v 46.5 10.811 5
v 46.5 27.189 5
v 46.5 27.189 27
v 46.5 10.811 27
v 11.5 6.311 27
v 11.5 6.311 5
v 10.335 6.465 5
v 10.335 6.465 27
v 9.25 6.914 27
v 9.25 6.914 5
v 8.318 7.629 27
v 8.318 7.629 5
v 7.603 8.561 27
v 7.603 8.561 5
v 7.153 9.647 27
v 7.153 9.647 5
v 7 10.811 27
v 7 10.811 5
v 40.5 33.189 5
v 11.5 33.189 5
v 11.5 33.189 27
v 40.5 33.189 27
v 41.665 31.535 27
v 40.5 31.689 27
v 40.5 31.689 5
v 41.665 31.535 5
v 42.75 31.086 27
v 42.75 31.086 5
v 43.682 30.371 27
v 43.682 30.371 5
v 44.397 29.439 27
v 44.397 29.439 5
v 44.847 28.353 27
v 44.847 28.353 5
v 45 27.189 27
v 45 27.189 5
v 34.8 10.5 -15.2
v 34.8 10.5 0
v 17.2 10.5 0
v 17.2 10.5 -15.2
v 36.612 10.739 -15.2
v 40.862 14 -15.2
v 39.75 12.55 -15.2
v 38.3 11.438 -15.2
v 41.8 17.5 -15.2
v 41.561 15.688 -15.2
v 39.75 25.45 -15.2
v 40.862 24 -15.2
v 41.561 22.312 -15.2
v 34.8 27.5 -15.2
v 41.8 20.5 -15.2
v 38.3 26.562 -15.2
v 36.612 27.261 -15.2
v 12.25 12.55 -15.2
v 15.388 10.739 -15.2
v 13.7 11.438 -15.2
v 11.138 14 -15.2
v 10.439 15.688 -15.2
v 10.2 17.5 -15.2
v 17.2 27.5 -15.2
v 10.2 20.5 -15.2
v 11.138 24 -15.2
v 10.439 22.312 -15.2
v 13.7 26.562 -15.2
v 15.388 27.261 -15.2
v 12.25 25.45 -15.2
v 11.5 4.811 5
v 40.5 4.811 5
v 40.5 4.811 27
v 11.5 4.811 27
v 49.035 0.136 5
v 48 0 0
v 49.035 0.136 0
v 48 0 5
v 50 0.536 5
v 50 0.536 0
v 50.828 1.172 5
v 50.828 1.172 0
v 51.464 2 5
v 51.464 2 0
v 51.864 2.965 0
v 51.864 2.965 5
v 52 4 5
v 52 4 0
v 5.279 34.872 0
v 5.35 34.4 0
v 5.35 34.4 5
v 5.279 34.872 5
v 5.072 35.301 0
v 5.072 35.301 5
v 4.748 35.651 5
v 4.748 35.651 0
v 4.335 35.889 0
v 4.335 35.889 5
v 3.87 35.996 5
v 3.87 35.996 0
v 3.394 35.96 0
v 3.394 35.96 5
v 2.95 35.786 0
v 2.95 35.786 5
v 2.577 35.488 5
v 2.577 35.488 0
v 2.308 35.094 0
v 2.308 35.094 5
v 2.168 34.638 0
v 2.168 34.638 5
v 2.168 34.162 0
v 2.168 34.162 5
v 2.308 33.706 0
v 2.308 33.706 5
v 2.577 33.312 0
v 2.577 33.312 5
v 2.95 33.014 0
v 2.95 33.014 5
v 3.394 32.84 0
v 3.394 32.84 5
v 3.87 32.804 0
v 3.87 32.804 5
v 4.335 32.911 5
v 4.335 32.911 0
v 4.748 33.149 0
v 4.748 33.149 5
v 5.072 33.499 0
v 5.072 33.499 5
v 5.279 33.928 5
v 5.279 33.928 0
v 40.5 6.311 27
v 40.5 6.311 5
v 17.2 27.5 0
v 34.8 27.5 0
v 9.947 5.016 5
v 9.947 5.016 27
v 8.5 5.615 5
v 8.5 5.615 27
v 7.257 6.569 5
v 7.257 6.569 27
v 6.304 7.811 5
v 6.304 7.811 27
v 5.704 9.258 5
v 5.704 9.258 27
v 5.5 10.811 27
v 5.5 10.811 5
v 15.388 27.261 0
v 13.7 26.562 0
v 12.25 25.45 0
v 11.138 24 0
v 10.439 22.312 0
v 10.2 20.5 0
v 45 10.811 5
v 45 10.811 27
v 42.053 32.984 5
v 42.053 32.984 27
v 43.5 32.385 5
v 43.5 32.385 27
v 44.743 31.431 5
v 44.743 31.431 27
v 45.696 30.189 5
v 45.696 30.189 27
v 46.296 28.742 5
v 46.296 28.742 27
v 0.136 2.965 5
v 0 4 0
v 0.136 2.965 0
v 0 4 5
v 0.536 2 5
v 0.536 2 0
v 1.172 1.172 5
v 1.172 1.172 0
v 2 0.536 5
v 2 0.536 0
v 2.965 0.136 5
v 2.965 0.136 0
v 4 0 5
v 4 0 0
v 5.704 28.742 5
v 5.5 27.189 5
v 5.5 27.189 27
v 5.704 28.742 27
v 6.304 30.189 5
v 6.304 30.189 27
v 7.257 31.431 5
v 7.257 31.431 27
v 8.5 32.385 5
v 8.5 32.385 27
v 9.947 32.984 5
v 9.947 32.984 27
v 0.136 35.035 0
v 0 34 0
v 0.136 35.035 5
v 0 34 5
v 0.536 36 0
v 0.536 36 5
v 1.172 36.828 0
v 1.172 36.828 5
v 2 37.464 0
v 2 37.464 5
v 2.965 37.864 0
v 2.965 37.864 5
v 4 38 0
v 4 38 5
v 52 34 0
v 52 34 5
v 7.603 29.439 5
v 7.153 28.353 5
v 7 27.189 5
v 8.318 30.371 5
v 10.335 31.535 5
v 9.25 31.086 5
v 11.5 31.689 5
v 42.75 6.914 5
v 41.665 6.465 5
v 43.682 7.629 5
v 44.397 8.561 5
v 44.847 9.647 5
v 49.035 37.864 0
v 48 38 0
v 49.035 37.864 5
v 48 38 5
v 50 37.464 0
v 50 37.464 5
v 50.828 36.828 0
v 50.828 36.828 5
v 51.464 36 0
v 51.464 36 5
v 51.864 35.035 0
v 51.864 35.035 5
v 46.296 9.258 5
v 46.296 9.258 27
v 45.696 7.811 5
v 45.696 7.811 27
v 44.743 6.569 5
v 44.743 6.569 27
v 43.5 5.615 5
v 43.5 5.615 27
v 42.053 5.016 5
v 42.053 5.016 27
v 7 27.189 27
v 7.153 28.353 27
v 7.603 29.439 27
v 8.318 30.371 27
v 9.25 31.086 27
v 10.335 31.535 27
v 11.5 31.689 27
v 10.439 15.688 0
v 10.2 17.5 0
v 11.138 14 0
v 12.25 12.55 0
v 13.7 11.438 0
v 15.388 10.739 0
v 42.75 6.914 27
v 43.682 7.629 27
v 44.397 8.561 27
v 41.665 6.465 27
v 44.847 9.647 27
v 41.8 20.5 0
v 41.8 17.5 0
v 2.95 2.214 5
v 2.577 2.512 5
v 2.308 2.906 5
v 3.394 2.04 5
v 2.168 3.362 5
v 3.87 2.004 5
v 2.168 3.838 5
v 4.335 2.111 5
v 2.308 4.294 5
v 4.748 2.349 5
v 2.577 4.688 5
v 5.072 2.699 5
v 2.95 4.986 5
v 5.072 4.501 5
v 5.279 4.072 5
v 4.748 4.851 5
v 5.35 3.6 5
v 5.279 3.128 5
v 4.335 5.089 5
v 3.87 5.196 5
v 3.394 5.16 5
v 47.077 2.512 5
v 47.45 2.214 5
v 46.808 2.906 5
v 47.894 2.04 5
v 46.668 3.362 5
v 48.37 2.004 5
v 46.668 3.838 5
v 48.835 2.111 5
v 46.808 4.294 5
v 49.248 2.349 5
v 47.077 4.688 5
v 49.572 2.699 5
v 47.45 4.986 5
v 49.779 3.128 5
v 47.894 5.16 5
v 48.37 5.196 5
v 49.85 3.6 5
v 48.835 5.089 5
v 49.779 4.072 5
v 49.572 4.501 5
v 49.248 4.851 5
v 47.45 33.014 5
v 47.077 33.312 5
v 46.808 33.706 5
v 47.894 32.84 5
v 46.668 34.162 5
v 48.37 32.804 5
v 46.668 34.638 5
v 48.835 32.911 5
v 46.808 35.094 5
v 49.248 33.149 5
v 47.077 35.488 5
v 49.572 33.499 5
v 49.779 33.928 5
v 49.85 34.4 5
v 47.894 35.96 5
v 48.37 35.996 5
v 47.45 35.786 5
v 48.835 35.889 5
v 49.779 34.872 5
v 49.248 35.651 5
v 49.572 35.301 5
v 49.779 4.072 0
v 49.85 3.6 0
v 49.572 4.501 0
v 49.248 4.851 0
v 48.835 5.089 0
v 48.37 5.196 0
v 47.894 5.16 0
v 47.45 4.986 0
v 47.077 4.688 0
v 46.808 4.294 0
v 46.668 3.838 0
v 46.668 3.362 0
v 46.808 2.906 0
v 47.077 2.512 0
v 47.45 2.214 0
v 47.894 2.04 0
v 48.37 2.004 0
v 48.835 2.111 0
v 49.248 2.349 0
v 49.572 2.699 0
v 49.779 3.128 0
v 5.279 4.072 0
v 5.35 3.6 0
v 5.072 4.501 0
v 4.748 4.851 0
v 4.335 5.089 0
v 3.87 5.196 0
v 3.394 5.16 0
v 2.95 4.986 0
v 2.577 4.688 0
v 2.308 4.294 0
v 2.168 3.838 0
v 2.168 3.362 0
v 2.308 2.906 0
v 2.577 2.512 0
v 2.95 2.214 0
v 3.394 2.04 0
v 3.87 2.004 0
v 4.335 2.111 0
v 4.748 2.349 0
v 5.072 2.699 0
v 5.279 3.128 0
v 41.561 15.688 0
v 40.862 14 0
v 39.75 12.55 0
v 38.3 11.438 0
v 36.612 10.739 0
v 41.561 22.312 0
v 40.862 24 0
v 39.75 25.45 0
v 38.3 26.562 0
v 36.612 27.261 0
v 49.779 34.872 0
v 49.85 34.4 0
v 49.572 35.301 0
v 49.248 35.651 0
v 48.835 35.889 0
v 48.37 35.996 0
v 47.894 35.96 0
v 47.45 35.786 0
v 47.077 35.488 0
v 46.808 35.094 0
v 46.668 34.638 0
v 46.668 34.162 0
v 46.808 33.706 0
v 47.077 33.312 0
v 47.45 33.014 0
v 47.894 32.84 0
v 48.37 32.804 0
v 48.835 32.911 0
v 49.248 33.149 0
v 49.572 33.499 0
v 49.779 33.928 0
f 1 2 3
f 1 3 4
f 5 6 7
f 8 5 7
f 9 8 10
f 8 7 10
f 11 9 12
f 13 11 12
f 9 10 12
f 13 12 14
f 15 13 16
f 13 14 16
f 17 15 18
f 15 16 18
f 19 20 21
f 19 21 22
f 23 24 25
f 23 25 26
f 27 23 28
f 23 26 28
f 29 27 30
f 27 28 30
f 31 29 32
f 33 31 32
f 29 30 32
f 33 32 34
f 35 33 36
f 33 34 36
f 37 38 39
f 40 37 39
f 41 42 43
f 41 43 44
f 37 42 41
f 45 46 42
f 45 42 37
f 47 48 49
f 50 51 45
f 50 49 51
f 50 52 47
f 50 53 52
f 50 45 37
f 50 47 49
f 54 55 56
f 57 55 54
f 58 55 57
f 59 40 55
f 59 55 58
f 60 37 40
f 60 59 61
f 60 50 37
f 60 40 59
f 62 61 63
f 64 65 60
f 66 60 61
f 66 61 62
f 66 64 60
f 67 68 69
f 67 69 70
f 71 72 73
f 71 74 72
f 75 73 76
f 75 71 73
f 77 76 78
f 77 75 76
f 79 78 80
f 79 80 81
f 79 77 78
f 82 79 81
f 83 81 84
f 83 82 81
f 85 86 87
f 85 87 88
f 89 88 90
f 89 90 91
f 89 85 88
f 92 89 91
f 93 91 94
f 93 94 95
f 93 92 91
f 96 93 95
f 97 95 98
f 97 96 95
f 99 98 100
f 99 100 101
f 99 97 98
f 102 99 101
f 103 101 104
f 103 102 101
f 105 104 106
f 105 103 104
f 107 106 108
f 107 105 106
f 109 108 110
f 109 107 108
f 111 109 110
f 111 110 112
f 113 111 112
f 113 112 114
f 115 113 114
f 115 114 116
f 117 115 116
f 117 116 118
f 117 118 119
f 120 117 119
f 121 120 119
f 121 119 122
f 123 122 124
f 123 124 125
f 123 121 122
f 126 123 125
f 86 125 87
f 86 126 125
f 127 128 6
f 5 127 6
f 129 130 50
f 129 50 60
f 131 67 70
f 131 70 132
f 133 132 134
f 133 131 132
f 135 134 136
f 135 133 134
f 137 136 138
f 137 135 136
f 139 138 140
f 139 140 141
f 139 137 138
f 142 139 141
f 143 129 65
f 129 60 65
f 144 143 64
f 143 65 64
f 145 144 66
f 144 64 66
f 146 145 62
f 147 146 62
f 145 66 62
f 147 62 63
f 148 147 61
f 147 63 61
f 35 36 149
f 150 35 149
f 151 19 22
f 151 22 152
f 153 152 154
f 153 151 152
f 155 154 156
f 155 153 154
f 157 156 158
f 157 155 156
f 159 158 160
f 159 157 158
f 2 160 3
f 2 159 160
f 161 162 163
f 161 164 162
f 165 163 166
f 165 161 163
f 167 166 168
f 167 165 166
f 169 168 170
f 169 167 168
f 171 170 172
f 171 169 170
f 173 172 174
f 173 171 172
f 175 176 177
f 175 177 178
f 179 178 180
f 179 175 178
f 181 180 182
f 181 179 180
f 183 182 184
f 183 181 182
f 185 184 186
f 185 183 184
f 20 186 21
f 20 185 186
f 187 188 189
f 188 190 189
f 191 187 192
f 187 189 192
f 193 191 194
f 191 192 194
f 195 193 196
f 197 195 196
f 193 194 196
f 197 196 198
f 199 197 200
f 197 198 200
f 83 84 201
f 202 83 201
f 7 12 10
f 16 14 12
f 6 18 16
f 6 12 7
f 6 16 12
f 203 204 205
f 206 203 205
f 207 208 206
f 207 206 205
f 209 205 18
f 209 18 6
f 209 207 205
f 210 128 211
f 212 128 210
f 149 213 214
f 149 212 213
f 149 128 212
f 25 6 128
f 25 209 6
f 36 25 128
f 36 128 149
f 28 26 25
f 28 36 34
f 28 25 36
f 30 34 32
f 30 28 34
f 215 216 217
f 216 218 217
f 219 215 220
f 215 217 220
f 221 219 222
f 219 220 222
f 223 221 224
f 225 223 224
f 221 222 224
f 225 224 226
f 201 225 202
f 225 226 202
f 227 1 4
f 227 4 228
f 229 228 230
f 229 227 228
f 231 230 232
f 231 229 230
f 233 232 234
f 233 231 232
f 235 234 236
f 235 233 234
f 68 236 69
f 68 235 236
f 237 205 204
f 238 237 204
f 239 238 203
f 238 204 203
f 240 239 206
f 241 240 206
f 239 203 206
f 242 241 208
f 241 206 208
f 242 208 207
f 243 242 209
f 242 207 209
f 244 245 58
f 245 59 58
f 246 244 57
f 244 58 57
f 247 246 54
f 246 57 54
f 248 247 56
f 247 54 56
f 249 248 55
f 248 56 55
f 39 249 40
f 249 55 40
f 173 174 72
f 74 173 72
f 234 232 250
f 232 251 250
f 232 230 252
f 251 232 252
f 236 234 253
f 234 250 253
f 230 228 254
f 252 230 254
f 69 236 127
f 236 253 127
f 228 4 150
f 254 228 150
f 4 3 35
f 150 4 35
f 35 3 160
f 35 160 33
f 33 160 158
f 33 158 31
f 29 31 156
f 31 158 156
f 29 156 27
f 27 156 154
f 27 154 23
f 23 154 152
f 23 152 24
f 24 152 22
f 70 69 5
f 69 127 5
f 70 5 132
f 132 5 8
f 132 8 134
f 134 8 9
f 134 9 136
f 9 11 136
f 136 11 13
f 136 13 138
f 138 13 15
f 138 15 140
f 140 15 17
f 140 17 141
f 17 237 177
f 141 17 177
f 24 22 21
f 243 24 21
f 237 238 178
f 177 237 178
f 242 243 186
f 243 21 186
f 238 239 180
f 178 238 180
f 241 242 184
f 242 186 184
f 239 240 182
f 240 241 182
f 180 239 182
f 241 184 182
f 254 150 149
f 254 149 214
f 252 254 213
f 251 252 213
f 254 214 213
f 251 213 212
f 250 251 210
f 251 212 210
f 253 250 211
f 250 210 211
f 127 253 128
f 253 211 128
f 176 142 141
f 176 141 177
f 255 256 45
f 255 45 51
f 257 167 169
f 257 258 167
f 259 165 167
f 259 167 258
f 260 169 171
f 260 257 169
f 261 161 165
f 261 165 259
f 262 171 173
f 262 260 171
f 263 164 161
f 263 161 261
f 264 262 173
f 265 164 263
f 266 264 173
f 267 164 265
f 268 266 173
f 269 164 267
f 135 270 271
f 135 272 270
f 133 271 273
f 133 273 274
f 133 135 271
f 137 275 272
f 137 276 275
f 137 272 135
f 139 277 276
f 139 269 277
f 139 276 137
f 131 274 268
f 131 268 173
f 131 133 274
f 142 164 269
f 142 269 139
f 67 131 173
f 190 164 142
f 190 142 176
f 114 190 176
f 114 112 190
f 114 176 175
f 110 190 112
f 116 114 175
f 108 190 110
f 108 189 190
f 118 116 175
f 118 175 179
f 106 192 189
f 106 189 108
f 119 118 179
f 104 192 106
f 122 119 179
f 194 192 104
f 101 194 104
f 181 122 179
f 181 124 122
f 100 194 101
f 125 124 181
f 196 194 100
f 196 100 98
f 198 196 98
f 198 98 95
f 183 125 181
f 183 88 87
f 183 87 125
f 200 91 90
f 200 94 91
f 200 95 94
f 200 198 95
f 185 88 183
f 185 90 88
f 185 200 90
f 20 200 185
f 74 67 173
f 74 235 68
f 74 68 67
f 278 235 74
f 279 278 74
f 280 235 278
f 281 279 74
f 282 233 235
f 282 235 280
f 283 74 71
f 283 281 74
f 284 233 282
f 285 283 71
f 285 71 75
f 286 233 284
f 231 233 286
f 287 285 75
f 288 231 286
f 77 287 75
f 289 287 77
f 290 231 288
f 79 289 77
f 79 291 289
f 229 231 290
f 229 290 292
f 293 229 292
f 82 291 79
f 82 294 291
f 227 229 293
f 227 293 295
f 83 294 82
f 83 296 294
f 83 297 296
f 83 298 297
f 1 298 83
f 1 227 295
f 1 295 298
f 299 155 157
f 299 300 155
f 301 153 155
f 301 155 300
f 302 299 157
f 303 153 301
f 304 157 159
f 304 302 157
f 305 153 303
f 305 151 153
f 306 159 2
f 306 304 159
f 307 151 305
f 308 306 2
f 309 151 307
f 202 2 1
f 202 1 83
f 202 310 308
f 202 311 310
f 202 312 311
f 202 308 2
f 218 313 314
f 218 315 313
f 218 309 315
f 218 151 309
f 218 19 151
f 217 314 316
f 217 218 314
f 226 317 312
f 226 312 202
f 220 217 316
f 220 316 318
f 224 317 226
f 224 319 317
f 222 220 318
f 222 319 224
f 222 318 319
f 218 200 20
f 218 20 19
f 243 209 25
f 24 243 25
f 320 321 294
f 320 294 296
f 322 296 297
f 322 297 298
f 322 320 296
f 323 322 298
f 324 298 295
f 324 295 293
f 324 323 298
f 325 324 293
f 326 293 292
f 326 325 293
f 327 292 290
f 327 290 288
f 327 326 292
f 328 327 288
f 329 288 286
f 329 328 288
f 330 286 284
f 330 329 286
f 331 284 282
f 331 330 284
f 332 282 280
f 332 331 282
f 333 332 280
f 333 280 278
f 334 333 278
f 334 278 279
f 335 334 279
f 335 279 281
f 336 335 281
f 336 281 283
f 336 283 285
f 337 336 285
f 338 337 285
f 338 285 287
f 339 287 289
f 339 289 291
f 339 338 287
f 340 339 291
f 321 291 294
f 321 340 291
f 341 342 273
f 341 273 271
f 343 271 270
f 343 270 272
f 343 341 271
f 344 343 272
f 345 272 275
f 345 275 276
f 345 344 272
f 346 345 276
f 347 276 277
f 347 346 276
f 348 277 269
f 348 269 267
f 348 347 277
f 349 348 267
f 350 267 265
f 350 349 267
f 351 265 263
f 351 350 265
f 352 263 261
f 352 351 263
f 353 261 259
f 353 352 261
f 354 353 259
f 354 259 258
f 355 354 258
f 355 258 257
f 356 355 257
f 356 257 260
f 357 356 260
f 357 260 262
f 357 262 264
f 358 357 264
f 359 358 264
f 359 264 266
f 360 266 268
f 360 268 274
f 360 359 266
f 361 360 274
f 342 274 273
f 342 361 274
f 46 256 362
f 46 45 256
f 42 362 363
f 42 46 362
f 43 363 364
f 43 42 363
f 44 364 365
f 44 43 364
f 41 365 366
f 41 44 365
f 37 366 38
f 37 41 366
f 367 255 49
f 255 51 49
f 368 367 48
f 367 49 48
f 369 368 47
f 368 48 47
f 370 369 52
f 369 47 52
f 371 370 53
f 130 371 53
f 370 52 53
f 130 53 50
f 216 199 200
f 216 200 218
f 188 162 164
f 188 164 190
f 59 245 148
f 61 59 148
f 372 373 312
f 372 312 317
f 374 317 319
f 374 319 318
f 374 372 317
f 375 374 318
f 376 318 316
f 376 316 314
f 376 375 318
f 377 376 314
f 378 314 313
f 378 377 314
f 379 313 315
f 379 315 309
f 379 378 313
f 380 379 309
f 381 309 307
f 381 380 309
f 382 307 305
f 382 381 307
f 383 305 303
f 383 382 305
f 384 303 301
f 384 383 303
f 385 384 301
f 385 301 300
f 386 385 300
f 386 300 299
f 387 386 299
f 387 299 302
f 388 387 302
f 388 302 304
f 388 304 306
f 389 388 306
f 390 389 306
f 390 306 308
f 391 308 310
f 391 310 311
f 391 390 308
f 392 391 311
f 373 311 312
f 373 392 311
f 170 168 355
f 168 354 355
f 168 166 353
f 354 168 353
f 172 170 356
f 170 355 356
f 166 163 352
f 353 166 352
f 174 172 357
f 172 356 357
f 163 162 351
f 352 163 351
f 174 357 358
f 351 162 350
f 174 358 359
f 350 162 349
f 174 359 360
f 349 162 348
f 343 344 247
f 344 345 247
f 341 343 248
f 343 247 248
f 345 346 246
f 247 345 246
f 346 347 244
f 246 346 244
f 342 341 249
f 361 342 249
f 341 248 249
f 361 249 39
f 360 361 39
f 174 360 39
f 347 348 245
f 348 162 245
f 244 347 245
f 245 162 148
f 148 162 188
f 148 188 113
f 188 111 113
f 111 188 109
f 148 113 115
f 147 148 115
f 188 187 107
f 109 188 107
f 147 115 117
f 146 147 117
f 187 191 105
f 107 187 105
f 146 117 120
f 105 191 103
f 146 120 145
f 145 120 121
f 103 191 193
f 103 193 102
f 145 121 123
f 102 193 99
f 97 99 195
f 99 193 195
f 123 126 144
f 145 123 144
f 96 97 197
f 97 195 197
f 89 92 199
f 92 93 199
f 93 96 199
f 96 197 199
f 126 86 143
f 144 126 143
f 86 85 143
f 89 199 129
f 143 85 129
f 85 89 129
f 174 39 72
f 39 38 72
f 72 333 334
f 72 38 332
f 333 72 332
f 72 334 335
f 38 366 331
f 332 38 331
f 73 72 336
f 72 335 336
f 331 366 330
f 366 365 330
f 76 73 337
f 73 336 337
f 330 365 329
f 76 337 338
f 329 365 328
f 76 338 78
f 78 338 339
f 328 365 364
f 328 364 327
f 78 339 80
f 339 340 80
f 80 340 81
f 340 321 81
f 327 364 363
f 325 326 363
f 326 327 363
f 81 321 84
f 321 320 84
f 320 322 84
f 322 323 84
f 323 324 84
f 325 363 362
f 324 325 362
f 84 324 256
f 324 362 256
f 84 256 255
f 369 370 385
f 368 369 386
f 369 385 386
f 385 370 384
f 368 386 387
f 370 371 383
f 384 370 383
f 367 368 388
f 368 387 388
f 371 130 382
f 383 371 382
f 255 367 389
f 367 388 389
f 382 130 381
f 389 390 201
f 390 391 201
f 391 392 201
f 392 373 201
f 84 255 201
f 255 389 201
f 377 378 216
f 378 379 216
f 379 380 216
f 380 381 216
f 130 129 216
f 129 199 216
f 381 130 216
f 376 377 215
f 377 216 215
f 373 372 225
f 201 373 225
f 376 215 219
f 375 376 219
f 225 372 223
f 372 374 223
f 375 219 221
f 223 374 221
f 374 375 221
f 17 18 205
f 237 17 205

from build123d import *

# Parameters (mm, degrees)
SKETCH1_W           = 52
SKETCH1_H           = 38
SKETCH1_R           = 1.6
BOSS_EXTRUDE1_DEPTH = 5
SKETCH5_W           = 31.6
SKETCH5_H           = 17
BOSS_EXTRUDE2_DEPTH = 15.2
BOSS_EXTRUDE3_DEPTH = 22
FILLET1_R           = 4
FILLET2_R           = 7


with BuildPart() as part:
    # Sketch1 → Boss-Extrude1 (new body)
    with BuildSketch(Plane.XY):
        with Locations((26, 19)):
            Rectangle(SKETCH1_W, SKETCH1_H)
        with Locations((3.75, 34.4)):
            Circle(SKETCH1_R, mode=Mode.SUBTRACT)
        with Locations((48.25, 34.4)):
            Circle(SKETCH1_R, mode=Mode.SUBTRACT)
        with Locations((48.25, 3.6)):
            Circle(SKETCH1_R, mode=Mode.SUBTRACT)
        with Locations((3.75, 3.6)):
            Circle(SKETCH1_R, mode=Mode.SUBTRACT)
    extrude(amount=BOSS_EXTRUDE1_DEPTH)

    # Sketch5 → Boss-Extrude2 (add)
    with BuildSketch(Plane(origin=(0, 0, 0), x_dir=(-1, 0, 0), z_dir=(0, 0, -1))):
        with Locations((-26, 19)):
            Rectangle(SKETCH5_W, SKETCH5_H)
    extrude(amount=BOSS_EXTRUDE2_DEPTH)

    # Sketch7 → Boss-Extrude3 (add)
    with BuildSketch(Plane.XY.offset(5)):
        with BuildLine():
            Line((11.5, 33.188764045), (40.5, 33.188764045))
            ThreePointArc((40.5, 33.188764045), (44.742640687, 31.431404732), (46.5, 27.188764045))
            Line((46.5, 27.188764045), (46.5, 10.811235955))
            ThreePointArc((46.5, 10.811235955), (44.742640687, 6.568595268), (40.5, 4.811235955))
            Line((40.5, 4.811235955), (11.5, 4.811235955))
            ThreePointArc((11.5, 4.811235955), (7.257359313, 6.568595268), (5.5, 10.811235955))
            Line((5.5, 10.811235955), (5.5, 27.188764045))
            ThreePointArc((5.5, 27.188764045), (7.257359313, 31.431404732), (11.5, 33.188764045))
        make_face()
        with BuildLine():
            Line((11.5, 31.688764045), (40.5, 31.688764045))
            ThreePointArc((40.5, 31.688764045), (43.681980515, 30.37074456), (45, 27.188764045))
            Line((45, 27.188764045), (45, 10.811235955))
            ThreePointArc((45, 10.811235955), (43.681980515, 7.62925544), (40.5, 6.311235955))
            Line((40.5, 6.311235955), (11.5, 6.311235955))
            ThreePointArc((11.5, 6.311235955), (8.318019485, 7.62925544), (7, 10.811235955))
            Line((7, 10.811235955), (7, 27.188764045))
            ThreePointArc((7, 27.188764045), (8.318019485, 30.37074456), (11.5, 31.688764045))
        make_face(mode=Mode.SUBTRACT)
    extrude(amount=BOSS_EXTRUDE3_DEPTH)

    # Fillet1
    fillet1_edges = [part.edges().sort_by_distance(p)[0] for p in [
        (0, 0, 2.5),
        (0, 38, 2.5),
        (52, 38, 2.5),
        (52, 0, 2.5),
    ]]
    fillet(fillet1_edges, radius=FILLET1_R)

    # Fillet2
    fillet2_edges = [part.edges().sort_by_distance(p)[0] for p in [
        (41.8, 27.5, -7.6),
        (41.8, 10.5, -7.6),
        (10.2, 10.5, -7.6),
        (10.2, 27.5, -7.6),
    ]]
    fillet(fillet2_edges, radius=FILLET2_R)


solid = part.part
